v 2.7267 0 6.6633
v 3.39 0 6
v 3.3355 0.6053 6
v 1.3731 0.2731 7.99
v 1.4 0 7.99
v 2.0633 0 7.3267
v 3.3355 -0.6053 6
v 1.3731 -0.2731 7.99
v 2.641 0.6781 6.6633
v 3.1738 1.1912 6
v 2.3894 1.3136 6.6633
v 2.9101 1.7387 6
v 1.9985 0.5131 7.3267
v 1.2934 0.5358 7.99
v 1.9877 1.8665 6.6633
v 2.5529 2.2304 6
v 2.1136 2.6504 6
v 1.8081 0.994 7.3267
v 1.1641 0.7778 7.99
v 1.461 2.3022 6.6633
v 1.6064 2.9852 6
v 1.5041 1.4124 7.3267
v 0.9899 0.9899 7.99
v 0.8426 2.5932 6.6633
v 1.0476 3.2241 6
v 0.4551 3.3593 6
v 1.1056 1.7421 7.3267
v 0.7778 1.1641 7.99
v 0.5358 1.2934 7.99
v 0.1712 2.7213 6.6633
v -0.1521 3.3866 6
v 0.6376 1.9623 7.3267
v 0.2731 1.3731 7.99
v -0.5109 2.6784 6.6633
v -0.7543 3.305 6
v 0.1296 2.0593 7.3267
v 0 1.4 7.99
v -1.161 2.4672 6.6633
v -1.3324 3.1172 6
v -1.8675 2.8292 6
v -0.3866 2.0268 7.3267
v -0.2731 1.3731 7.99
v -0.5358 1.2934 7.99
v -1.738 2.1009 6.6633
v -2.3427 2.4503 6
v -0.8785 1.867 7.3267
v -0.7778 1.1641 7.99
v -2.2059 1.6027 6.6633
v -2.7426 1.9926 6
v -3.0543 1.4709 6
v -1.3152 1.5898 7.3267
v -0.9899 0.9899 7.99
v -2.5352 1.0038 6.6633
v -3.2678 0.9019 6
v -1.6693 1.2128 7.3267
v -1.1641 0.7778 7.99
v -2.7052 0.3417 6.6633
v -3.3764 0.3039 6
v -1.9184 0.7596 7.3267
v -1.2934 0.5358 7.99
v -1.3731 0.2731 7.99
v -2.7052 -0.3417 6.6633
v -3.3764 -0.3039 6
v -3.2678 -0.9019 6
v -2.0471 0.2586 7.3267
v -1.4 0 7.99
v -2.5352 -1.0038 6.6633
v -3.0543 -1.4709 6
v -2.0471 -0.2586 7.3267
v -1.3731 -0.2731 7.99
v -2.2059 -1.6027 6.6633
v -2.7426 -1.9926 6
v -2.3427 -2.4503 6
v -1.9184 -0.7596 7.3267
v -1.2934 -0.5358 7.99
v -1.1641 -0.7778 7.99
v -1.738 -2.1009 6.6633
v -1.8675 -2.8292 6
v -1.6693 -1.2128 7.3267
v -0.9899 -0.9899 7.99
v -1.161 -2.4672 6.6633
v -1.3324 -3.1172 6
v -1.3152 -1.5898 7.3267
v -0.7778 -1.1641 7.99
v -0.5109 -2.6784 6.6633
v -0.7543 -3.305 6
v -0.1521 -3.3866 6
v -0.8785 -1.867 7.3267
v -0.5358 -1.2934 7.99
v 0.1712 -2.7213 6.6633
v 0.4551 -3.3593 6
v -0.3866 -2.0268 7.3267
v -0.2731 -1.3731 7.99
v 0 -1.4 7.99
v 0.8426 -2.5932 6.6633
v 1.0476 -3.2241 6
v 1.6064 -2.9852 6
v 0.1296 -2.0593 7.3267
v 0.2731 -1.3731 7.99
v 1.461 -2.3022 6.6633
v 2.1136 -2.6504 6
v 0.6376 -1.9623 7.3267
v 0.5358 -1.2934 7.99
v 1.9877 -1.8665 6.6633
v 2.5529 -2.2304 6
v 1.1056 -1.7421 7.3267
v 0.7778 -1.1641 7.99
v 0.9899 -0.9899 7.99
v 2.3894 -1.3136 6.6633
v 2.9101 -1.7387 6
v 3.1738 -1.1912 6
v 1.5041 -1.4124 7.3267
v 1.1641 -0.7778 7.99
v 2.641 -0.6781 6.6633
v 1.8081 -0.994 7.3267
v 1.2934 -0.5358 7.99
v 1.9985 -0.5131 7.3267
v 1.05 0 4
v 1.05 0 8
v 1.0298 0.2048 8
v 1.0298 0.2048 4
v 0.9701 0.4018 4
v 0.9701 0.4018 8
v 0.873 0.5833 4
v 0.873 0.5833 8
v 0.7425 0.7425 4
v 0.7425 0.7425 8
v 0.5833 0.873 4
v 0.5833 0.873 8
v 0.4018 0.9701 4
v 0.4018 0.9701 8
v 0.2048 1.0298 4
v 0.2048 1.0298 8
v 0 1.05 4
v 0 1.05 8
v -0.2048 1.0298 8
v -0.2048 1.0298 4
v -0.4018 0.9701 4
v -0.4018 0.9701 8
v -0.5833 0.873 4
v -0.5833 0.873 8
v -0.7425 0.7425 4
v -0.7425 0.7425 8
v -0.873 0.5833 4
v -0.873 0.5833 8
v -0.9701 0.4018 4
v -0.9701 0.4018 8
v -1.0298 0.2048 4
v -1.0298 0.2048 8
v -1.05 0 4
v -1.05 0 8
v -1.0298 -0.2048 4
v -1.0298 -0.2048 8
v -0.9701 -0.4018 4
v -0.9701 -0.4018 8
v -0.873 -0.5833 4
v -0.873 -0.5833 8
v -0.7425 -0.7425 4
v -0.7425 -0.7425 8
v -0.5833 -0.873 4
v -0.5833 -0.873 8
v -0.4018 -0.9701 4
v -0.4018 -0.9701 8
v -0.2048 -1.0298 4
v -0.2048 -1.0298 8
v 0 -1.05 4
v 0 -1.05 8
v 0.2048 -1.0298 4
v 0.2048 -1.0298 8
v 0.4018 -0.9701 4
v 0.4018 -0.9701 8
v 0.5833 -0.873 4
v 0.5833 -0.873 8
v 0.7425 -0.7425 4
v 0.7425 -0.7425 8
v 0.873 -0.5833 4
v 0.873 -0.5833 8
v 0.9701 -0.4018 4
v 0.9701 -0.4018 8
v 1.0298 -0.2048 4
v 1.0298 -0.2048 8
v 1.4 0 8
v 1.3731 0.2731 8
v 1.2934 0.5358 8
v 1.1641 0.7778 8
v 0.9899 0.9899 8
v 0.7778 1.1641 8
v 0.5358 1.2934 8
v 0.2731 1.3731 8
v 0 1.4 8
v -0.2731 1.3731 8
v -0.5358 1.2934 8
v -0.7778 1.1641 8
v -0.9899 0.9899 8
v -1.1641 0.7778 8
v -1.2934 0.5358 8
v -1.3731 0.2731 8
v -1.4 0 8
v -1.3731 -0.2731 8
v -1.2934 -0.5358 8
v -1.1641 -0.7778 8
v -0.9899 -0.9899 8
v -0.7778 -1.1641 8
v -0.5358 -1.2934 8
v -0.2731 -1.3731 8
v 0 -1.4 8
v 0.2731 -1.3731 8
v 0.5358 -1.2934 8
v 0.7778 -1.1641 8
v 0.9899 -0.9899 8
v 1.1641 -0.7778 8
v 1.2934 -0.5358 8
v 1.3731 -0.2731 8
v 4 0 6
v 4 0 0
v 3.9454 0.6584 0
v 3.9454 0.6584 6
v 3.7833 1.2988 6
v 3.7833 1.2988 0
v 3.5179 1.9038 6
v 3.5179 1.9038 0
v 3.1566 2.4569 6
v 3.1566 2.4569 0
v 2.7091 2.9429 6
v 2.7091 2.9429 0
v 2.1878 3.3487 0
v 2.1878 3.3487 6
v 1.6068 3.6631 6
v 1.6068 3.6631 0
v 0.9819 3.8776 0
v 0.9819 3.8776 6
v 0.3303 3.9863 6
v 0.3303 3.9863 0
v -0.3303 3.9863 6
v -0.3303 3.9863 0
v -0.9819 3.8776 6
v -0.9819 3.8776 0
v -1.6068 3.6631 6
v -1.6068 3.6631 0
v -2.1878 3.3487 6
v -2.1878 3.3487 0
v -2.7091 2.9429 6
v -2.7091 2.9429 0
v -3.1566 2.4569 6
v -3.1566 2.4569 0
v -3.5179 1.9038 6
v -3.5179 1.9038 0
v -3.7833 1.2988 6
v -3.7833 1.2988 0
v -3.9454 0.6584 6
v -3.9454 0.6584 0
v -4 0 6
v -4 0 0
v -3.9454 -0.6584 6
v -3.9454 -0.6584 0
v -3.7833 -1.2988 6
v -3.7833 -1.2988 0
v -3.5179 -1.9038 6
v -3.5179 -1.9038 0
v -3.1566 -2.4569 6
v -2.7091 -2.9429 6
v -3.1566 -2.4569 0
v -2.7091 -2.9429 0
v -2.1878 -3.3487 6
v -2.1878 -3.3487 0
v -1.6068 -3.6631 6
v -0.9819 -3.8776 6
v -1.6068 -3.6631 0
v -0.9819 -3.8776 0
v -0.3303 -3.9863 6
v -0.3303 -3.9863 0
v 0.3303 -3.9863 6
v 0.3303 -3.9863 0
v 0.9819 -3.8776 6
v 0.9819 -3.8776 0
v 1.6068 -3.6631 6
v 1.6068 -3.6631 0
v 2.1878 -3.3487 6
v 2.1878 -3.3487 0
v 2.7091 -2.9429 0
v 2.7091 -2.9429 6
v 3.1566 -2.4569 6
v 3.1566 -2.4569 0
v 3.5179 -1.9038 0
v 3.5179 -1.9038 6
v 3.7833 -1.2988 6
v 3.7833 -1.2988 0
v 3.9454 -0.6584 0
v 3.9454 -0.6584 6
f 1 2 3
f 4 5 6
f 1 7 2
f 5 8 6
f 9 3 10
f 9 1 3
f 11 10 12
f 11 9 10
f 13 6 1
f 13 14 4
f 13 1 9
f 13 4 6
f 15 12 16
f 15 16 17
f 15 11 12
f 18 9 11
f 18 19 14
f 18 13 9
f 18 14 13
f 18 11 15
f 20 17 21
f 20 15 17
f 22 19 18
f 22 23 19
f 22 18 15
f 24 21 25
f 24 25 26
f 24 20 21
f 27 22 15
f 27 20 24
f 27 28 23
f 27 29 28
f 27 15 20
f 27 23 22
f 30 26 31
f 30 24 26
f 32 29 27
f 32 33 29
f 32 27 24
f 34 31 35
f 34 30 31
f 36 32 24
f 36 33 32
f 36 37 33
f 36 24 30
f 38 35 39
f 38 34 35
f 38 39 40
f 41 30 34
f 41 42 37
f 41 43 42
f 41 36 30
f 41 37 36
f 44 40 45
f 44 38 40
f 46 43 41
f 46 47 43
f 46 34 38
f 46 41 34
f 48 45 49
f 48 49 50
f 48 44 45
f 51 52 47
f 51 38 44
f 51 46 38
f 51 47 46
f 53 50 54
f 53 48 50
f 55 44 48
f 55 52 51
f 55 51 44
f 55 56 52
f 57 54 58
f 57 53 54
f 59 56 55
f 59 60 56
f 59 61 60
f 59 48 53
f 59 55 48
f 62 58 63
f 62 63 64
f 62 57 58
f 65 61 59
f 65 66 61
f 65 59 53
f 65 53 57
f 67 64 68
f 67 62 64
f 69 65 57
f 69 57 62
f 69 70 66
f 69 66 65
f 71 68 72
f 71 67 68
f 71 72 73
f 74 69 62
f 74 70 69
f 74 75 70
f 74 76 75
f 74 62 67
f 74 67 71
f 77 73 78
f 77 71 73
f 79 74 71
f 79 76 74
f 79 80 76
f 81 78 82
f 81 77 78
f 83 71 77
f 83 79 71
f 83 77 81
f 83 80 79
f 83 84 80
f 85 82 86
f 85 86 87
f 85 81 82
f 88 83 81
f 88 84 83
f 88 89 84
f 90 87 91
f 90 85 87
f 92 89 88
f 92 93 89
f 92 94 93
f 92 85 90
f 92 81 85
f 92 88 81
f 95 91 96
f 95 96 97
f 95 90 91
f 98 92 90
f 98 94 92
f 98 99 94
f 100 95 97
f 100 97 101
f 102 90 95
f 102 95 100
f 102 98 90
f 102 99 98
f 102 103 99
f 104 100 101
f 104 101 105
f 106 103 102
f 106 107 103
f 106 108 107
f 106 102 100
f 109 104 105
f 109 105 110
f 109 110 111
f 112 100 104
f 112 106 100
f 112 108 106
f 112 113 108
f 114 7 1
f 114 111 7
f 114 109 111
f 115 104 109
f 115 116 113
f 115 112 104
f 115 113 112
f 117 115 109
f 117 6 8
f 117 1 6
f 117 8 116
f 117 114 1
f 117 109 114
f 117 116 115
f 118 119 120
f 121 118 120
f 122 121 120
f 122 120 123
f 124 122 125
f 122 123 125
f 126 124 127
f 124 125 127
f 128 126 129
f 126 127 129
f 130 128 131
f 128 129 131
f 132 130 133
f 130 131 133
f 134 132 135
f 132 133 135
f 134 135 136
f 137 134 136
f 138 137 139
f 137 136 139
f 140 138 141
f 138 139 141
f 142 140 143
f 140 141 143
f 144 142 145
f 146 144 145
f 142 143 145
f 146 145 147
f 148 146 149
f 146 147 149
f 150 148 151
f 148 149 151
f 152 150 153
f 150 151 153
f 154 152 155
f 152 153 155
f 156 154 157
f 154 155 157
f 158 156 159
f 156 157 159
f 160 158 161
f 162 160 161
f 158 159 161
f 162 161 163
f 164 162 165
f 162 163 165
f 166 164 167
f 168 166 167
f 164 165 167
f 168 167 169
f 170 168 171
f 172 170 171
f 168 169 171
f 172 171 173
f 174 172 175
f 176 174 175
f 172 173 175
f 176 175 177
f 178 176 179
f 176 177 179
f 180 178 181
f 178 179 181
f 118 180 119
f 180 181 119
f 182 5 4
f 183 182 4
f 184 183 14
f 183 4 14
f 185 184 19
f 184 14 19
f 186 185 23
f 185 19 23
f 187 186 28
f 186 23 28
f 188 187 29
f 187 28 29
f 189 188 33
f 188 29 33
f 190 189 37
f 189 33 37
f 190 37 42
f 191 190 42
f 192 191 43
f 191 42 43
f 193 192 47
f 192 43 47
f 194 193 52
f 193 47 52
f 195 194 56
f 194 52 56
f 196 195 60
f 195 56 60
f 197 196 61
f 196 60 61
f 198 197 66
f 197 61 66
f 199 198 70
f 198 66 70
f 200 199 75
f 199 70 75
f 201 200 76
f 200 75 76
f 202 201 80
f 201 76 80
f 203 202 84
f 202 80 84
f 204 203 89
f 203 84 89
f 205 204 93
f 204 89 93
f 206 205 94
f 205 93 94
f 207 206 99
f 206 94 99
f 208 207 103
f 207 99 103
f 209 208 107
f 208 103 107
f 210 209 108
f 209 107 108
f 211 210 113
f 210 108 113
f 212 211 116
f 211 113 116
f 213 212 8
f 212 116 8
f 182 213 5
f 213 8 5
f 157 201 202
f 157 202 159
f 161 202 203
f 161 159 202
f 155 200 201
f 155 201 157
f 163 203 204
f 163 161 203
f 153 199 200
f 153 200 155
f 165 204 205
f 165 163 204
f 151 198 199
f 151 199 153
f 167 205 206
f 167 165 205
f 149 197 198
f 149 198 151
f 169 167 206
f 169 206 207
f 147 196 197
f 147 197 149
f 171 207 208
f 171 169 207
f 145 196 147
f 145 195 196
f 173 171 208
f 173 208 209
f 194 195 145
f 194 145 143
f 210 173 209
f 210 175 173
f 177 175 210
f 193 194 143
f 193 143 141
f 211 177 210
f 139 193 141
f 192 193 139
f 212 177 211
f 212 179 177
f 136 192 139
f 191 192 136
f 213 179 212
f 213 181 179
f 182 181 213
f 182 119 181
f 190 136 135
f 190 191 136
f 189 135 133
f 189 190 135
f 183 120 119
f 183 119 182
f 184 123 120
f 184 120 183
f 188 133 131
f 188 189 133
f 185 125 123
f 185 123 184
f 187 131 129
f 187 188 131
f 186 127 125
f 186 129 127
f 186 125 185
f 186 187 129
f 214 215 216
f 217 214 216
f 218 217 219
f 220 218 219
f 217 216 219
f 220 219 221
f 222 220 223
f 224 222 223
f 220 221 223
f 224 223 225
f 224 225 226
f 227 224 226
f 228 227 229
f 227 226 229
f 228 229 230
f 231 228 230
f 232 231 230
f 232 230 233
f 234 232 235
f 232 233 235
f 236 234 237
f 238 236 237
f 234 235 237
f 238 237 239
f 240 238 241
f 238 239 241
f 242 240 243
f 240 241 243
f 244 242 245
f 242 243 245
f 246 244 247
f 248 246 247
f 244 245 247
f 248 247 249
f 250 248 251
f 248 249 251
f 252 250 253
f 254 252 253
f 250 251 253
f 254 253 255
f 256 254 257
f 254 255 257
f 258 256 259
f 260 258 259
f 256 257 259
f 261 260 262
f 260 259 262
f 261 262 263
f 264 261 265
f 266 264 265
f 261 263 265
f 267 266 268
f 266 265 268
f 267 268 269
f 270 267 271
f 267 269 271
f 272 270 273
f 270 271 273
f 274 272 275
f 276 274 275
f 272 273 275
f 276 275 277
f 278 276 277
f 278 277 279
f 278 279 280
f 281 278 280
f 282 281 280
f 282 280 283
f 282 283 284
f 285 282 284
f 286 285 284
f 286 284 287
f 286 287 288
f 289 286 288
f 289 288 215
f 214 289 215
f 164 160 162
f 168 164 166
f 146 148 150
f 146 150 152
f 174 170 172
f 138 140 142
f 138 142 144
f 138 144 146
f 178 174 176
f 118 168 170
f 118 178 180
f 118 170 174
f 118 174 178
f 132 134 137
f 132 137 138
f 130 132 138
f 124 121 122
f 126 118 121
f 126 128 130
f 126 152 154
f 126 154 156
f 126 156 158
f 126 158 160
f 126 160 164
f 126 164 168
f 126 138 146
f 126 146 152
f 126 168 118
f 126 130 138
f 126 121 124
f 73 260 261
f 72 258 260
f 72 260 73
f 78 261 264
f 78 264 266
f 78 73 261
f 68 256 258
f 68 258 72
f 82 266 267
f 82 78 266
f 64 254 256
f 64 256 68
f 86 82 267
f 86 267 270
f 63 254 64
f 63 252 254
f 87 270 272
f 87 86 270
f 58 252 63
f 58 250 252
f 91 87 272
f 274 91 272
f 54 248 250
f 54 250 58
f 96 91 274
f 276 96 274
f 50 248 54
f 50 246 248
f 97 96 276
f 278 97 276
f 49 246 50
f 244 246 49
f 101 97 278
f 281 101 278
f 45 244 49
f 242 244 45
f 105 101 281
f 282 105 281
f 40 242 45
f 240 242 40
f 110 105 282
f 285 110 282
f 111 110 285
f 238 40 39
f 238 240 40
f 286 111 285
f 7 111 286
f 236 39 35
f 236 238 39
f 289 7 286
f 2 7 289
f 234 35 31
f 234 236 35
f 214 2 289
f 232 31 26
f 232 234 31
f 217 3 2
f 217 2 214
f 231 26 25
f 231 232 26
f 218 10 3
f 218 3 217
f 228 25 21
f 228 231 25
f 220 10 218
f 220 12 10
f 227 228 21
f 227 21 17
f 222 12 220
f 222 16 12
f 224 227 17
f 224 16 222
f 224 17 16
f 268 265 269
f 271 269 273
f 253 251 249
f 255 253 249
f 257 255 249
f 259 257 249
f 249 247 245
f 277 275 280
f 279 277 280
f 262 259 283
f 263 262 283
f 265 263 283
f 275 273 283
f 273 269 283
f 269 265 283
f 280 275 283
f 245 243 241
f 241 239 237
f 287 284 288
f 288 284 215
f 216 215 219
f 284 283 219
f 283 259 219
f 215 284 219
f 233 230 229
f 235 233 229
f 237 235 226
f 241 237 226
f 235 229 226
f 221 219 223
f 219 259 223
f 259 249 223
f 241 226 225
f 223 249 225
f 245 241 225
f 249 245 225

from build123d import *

# Parameters (mm, degrees)
SKETCH_R     = 4
PAD_DEPTH    = 6
SKETCH001_R  = 1.4
PAD001_DEPTH = 2
CHAMFER_SIZE = 1.99
SKETCH002_R  = 1.05
POCKET_DEPTH = 4


with BuildPart() as part:
    # Sketch → Pad (new body)
    with BuildSketch(Plane.XY):
        Circle(SKETCH_R)
    extrude(amount=PAD_DEPTH)

    # Sketch001 (on Face3 of Pad) → Pad001 (join)
    with BuildSketch(Plane.XY.offset(6)):
        Circle(SKETCH001_R)
    extrude(amount=PAD001_DEPTH)

    # Chamfer
    chamfer_edges = [part.edges().sort_by_distance(p)[0] for p in [
        (-1.4, 0, 6),
    ]]
    chamfer(chamfer_edges, length=CHAMFER_SIZE)

    # Sketch002 (on Face6 of Chamfer) → Pocket (cut)
    with BuildSketch(Plane.XY.offset(8)):
        Circle(SKETCH002_R)
    extrude(amount=-POCKET_DEPTH, mode=Mode.SUBTRACT)


solid = part.part
